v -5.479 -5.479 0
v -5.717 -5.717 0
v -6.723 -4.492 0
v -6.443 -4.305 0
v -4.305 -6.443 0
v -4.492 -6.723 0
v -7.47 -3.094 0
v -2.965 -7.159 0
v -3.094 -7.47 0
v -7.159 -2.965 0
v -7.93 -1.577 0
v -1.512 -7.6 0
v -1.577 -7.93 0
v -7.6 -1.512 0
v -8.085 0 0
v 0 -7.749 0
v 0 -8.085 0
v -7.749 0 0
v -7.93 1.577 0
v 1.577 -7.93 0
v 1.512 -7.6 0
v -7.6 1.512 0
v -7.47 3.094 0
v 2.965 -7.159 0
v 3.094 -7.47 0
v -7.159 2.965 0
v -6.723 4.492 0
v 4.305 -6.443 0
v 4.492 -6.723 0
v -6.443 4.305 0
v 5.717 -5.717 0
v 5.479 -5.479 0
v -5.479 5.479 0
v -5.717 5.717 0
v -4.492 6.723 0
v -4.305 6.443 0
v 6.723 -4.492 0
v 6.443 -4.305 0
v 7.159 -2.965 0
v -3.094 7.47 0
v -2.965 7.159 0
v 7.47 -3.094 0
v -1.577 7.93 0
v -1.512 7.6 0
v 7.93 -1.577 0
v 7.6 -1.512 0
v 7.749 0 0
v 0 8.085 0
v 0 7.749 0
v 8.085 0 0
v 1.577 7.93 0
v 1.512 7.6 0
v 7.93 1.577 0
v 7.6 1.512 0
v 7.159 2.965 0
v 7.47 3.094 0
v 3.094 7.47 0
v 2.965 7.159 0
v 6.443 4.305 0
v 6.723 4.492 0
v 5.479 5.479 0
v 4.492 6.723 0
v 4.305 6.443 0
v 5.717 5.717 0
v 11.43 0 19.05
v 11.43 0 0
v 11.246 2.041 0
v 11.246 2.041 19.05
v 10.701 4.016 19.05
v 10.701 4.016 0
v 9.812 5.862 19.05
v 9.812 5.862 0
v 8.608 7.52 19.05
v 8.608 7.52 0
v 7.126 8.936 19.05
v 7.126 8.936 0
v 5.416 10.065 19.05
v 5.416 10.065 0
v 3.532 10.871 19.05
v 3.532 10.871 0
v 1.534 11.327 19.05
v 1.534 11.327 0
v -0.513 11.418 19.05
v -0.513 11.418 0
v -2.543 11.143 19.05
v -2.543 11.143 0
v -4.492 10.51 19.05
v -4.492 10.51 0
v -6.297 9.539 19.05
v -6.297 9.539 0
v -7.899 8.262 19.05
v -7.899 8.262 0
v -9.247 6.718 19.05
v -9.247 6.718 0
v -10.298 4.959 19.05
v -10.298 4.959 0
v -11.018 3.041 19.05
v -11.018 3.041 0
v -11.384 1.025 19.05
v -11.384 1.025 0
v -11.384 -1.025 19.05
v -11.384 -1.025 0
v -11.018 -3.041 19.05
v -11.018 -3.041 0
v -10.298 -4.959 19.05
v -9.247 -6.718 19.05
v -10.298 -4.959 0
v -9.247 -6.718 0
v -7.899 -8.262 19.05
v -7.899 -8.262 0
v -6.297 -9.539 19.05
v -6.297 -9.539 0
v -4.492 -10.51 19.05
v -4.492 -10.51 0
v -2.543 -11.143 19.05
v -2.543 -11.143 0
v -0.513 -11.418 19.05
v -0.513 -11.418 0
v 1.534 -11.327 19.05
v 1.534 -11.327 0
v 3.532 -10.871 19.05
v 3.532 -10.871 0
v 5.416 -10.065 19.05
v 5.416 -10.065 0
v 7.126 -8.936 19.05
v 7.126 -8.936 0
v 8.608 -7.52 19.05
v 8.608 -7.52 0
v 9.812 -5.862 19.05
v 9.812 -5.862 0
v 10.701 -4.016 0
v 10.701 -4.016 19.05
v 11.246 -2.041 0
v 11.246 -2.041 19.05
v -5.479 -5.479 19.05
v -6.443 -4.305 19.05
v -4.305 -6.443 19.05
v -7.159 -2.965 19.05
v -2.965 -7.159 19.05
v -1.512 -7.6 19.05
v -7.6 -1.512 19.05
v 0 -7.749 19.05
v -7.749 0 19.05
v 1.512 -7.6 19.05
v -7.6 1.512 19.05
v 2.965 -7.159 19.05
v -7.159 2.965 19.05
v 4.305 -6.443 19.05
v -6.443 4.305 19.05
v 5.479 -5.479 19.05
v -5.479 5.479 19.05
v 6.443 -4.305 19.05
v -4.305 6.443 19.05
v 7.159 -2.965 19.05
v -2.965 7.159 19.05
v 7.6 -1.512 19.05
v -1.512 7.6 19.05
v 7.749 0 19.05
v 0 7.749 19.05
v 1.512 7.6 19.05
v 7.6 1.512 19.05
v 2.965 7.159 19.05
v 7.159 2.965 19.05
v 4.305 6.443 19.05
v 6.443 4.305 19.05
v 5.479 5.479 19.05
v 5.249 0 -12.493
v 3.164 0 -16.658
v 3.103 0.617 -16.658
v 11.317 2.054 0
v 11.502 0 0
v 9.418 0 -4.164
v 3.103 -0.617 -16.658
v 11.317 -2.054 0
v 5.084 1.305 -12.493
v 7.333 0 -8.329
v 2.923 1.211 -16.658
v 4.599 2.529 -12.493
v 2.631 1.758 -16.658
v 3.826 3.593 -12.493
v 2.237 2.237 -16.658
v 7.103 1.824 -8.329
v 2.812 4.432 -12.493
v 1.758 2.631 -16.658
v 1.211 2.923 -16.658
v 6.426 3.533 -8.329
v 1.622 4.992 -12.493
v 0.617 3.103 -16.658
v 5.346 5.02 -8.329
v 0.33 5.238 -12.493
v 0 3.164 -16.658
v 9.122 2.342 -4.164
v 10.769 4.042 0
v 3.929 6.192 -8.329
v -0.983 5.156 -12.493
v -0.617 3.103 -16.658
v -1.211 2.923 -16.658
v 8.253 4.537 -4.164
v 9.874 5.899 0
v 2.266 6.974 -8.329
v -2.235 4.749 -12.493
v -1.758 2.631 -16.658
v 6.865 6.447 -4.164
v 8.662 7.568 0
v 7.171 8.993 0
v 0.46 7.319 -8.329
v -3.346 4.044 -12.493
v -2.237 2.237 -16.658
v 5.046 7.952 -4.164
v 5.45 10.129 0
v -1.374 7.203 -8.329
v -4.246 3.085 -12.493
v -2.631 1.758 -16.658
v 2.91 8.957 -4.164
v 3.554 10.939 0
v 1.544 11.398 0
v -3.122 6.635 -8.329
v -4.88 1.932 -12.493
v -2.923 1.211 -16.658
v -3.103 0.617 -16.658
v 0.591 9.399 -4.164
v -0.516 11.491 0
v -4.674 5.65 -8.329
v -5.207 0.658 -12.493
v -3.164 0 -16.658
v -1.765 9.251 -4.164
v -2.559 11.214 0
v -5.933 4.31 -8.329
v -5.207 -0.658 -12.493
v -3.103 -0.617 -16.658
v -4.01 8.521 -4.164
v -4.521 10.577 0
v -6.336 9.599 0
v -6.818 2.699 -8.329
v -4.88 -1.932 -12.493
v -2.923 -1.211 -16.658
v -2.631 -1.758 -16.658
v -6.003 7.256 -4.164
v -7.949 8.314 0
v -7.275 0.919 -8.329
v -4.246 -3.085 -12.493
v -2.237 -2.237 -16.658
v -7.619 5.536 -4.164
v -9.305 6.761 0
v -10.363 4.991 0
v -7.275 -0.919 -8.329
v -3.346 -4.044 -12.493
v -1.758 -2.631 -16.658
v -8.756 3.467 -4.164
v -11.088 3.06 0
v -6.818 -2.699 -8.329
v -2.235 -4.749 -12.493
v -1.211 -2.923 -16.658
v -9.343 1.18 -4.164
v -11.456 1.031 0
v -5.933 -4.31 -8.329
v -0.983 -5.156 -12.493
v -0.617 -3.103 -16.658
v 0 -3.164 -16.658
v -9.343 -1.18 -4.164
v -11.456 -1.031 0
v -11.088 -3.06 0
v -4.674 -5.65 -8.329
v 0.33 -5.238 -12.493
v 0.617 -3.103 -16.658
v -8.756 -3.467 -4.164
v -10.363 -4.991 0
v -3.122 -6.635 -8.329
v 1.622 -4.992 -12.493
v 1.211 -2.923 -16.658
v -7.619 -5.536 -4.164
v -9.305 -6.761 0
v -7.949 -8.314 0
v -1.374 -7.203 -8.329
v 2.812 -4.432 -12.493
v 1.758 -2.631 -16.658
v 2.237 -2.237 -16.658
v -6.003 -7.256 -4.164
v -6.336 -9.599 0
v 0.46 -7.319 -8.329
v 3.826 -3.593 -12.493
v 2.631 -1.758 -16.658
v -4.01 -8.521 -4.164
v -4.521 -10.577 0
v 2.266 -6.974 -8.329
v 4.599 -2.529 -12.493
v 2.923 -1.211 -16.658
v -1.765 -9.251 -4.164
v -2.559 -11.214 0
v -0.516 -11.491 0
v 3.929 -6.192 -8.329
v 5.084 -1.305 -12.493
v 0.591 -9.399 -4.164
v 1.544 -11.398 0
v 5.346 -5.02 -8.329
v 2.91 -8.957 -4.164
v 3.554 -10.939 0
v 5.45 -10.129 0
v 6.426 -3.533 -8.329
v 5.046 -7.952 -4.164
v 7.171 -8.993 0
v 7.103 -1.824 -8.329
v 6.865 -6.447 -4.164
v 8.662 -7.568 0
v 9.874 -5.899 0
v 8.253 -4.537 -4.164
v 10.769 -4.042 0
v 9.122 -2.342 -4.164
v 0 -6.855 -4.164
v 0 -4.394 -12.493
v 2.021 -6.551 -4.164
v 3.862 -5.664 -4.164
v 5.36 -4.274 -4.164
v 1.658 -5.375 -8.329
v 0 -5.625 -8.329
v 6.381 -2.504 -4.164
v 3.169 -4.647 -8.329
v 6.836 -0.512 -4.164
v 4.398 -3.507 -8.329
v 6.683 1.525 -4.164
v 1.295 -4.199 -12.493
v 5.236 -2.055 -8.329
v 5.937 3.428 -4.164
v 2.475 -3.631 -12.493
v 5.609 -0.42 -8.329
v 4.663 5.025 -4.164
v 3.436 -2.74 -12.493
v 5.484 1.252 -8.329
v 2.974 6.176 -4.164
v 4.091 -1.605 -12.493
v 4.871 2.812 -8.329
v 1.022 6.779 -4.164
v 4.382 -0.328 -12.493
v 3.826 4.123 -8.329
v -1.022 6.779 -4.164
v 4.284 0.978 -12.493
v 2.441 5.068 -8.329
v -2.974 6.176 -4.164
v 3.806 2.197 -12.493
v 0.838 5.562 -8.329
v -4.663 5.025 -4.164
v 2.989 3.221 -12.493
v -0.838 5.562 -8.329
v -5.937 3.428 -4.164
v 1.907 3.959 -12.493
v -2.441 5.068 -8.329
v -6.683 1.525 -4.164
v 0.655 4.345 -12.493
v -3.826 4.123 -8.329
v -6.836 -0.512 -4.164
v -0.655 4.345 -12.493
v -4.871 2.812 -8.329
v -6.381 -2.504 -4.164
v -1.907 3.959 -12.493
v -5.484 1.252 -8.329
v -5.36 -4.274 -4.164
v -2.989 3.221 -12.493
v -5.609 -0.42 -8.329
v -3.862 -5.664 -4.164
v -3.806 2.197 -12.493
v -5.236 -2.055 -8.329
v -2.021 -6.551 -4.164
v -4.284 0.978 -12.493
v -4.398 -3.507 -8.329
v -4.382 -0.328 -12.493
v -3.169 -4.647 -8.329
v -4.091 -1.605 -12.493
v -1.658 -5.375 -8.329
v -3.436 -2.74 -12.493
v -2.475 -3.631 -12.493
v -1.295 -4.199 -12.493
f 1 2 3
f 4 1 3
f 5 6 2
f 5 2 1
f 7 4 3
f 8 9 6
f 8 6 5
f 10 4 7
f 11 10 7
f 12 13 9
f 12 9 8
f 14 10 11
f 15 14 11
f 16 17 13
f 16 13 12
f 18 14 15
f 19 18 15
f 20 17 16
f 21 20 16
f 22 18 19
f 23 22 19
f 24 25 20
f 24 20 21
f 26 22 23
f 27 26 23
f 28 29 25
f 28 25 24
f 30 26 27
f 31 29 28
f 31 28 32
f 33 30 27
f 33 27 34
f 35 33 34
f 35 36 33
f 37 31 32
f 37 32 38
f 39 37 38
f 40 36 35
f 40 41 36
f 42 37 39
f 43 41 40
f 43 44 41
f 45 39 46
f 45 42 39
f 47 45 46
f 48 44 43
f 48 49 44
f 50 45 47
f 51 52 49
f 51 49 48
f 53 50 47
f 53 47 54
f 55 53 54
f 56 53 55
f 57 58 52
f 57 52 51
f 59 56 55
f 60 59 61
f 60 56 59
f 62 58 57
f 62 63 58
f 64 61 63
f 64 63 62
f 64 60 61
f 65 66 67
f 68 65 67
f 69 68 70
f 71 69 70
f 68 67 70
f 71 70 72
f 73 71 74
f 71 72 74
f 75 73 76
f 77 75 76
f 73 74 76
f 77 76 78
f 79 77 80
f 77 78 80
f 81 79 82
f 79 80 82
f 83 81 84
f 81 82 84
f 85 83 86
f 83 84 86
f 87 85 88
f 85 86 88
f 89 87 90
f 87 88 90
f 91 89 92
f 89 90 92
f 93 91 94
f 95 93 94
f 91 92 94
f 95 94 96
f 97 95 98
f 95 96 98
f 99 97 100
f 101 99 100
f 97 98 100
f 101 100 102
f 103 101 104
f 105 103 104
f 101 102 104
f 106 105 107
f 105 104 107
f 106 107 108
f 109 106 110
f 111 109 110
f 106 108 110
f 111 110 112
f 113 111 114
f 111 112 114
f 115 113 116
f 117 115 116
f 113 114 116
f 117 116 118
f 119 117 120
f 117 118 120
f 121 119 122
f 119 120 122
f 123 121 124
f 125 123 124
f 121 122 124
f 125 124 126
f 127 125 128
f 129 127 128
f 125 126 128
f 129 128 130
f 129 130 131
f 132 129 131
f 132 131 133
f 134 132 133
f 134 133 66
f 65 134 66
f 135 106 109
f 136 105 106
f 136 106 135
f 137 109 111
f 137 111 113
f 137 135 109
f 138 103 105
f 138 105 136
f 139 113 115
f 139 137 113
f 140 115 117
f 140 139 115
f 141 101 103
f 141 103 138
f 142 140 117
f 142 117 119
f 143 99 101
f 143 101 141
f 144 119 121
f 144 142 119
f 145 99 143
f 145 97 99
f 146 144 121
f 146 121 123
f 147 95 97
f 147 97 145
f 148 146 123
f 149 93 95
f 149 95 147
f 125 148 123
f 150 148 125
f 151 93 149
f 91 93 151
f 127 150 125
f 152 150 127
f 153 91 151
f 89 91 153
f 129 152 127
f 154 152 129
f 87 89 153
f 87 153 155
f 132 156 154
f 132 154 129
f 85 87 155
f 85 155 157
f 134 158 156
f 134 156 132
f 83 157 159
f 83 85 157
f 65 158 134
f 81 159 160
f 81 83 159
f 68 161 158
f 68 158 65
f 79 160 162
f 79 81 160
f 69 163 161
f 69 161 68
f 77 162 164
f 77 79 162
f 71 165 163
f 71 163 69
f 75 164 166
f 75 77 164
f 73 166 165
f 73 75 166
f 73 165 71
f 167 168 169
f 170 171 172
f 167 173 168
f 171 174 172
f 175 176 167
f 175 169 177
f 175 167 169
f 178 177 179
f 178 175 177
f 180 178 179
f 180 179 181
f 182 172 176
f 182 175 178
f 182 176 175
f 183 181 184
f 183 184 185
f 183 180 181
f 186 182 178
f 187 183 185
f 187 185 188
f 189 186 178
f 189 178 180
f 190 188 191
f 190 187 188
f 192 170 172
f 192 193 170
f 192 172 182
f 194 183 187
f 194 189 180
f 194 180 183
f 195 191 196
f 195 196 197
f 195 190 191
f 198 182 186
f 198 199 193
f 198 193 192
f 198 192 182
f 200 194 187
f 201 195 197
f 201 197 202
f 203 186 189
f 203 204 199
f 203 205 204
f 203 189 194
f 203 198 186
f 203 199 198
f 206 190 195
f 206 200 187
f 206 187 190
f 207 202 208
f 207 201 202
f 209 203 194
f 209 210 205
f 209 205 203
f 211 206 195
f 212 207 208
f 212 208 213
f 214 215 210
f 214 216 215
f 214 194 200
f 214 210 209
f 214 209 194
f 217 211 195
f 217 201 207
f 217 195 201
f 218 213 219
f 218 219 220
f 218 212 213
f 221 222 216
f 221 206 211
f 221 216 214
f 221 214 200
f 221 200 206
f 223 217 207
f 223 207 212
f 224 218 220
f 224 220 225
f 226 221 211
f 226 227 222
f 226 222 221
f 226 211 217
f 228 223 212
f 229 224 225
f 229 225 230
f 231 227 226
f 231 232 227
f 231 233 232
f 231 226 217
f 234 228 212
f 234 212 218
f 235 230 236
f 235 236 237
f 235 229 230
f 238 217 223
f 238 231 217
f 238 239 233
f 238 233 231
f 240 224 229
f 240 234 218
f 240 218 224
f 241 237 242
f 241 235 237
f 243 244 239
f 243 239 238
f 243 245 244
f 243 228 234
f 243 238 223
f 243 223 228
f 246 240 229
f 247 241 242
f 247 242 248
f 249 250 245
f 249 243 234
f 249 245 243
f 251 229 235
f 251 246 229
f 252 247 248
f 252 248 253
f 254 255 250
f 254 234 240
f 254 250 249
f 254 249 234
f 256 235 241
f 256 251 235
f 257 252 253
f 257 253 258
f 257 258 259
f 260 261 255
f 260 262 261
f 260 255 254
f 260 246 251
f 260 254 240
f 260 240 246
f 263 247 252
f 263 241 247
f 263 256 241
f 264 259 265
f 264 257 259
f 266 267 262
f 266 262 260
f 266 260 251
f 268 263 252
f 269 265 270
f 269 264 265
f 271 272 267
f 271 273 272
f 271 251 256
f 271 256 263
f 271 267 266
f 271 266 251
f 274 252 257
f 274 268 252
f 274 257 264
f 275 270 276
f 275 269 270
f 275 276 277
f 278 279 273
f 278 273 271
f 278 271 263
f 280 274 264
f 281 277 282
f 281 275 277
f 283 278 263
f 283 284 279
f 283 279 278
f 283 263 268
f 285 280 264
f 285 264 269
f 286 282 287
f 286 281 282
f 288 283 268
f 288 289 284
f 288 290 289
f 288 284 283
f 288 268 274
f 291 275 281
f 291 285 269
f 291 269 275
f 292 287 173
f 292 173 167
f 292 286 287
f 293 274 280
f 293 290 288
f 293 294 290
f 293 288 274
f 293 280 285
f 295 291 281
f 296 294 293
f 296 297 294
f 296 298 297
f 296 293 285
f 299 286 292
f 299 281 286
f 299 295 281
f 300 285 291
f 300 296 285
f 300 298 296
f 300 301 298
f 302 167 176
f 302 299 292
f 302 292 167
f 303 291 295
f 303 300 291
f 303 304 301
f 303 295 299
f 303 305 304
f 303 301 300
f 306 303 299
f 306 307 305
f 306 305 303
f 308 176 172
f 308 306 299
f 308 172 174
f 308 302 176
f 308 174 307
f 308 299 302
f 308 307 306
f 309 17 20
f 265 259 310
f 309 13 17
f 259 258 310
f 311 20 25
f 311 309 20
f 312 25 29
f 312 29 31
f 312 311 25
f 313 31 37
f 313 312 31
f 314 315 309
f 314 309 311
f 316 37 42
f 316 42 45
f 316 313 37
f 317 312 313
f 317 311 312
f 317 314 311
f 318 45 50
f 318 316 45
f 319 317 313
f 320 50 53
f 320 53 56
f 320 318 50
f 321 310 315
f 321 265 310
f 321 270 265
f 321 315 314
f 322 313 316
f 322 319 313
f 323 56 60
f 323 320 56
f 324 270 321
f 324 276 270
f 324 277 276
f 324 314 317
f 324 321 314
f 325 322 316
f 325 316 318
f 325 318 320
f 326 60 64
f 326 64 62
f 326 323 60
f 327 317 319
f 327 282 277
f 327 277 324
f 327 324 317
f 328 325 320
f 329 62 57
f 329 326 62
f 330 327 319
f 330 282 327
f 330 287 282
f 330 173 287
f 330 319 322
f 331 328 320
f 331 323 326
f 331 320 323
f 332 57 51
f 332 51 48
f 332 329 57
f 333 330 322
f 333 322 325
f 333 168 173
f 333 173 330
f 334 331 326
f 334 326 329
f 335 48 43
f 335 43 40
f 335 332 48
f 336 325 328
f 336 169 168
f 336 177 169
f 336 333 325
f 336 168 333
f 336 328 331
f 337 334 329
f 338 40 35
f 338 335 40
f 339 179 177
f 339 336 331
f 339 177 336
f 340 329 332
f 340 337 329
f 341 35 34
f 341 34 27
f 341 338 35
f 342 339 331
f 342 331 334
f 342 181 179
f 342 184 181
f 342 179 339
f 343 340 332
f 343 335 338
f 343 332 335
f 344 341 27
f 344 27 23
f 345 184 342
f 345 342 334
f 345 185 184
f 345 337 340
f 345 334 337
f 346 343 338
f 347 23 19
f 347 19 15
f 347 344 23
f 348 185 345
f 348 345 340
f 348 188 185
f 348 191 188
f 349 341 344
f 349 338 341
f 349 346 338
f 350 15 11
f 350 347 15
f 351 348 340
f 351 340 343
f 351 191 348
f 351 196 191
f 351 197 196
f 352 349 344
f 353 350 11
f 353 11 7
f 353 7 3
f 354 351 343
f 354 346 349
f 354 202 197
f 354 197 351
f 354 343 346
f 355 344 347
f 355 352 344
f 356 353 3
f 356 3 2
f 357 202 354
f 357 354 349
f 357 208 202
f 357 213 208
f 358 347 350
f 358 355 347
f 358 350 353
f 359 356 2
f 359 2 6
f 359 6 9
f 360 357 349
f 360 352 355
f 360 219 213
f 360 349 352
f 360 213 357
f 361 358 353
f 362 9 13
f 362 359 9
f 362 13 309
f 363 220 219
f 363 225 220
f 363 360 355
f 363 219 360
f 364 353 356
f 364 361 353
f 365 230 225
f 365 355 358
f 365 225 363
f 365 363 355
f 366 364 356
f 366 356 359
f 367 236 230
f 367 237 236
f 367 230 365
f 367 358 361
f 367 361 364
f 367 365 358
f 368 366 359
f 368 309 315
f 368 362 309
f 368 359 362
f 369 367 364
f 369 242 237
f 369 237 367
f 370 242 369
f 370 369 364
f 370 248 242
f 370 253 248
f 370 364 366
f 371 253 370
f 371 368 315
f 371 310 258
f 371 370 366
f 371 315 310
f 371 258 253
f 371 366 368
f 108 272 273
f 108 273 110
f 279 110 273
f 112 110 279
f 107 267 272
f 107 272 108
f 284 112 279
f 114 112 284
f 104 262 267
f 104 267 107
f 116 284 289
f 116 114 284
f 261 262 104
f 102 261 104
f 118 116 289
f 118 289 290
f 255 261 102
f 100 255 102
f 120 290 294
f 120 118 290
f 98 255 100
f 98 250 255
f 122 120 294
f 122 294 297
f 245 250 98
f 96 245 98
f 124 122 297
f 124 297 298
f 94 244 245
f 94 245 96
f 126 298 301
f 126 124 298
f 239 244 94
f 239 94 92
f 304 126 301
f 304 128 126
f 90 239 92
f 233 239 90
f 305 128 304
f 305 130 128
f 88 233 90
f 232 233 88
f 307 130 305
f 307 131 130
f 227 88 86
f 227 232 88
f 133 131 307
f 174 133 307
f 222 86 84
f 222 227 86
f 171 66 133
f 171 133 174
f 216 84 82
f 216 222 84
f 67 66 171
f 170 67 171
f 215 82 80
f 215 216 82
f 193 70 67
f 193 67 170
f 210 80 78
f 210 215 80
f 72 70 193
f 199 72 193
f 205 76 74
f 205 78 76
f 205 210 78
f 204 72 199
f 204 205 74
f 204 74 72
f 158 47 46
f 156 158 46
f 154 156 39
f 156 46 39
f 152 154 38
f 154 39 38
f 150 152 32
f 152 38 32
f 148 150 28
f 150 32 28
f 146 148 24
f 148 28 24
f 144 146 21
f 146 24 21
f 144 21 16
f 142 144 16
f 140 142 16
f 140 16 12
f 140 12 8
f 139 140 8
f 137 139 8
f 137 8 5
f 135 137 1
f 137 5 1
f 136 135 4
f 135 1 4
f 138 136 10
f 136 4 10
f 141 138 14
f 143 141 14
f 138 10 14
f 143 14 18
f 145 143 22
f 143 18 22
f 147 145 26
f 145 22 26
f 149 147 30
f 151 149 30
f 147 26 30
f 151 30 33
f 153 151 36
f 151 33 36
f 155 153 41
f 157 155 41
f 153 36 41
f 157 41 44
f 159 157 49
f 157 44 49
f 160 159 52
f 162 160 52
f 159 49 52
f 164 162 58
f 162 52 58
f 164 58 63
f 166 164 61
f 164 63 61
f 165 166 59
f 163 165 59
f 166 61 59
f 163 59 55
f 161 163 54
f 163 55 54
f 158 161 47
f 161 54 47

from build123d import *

# Parameters (mm, degrees)
F0_R     = 11.43
F1_DEPTH = 19.05
F2_R     = 7.749073
F3_DEPTH = 19.05


with BuildPart() as f1:
    # F0 (on Top) → F1 (new body)
    with BuildSketch(Plane.XY):
        Circle(F0_R)
    extrude(amount=F1_DEPTH)

    # F2 (on face) → F3 (cut)
    with BuildSketch(Plane(origin=(0, 0, 0), x_dir=(1, 0, 0), z_dir=(0, 0, -1))):
        Circle(F2_R)
    extrude(amount=-F3_DEPTH, mode=Mode.SUBTRACT)

    # F4 (on Front) → F5 (revolve)
    with BuildSketch(Plane.XZ):
        Polygon((0, -22.978624), (11.502104, 0), (0, 0), align=None)
    revolve(axis=Axis((0, 0, -11.489312), (0, 0, 1)))

    # F6 (on Right) → F7 (revolve, cut)
    with BuildSketch(Plane.YZ):
        Polygon((0, 0), (-8.085498, 0), (0, -27.366927), align=None)
    revolve(axis=Axis((0, 0, -13.683463), (0, 0, 1)), mode=Mode.SUBTRACT)


solid = f1.part
